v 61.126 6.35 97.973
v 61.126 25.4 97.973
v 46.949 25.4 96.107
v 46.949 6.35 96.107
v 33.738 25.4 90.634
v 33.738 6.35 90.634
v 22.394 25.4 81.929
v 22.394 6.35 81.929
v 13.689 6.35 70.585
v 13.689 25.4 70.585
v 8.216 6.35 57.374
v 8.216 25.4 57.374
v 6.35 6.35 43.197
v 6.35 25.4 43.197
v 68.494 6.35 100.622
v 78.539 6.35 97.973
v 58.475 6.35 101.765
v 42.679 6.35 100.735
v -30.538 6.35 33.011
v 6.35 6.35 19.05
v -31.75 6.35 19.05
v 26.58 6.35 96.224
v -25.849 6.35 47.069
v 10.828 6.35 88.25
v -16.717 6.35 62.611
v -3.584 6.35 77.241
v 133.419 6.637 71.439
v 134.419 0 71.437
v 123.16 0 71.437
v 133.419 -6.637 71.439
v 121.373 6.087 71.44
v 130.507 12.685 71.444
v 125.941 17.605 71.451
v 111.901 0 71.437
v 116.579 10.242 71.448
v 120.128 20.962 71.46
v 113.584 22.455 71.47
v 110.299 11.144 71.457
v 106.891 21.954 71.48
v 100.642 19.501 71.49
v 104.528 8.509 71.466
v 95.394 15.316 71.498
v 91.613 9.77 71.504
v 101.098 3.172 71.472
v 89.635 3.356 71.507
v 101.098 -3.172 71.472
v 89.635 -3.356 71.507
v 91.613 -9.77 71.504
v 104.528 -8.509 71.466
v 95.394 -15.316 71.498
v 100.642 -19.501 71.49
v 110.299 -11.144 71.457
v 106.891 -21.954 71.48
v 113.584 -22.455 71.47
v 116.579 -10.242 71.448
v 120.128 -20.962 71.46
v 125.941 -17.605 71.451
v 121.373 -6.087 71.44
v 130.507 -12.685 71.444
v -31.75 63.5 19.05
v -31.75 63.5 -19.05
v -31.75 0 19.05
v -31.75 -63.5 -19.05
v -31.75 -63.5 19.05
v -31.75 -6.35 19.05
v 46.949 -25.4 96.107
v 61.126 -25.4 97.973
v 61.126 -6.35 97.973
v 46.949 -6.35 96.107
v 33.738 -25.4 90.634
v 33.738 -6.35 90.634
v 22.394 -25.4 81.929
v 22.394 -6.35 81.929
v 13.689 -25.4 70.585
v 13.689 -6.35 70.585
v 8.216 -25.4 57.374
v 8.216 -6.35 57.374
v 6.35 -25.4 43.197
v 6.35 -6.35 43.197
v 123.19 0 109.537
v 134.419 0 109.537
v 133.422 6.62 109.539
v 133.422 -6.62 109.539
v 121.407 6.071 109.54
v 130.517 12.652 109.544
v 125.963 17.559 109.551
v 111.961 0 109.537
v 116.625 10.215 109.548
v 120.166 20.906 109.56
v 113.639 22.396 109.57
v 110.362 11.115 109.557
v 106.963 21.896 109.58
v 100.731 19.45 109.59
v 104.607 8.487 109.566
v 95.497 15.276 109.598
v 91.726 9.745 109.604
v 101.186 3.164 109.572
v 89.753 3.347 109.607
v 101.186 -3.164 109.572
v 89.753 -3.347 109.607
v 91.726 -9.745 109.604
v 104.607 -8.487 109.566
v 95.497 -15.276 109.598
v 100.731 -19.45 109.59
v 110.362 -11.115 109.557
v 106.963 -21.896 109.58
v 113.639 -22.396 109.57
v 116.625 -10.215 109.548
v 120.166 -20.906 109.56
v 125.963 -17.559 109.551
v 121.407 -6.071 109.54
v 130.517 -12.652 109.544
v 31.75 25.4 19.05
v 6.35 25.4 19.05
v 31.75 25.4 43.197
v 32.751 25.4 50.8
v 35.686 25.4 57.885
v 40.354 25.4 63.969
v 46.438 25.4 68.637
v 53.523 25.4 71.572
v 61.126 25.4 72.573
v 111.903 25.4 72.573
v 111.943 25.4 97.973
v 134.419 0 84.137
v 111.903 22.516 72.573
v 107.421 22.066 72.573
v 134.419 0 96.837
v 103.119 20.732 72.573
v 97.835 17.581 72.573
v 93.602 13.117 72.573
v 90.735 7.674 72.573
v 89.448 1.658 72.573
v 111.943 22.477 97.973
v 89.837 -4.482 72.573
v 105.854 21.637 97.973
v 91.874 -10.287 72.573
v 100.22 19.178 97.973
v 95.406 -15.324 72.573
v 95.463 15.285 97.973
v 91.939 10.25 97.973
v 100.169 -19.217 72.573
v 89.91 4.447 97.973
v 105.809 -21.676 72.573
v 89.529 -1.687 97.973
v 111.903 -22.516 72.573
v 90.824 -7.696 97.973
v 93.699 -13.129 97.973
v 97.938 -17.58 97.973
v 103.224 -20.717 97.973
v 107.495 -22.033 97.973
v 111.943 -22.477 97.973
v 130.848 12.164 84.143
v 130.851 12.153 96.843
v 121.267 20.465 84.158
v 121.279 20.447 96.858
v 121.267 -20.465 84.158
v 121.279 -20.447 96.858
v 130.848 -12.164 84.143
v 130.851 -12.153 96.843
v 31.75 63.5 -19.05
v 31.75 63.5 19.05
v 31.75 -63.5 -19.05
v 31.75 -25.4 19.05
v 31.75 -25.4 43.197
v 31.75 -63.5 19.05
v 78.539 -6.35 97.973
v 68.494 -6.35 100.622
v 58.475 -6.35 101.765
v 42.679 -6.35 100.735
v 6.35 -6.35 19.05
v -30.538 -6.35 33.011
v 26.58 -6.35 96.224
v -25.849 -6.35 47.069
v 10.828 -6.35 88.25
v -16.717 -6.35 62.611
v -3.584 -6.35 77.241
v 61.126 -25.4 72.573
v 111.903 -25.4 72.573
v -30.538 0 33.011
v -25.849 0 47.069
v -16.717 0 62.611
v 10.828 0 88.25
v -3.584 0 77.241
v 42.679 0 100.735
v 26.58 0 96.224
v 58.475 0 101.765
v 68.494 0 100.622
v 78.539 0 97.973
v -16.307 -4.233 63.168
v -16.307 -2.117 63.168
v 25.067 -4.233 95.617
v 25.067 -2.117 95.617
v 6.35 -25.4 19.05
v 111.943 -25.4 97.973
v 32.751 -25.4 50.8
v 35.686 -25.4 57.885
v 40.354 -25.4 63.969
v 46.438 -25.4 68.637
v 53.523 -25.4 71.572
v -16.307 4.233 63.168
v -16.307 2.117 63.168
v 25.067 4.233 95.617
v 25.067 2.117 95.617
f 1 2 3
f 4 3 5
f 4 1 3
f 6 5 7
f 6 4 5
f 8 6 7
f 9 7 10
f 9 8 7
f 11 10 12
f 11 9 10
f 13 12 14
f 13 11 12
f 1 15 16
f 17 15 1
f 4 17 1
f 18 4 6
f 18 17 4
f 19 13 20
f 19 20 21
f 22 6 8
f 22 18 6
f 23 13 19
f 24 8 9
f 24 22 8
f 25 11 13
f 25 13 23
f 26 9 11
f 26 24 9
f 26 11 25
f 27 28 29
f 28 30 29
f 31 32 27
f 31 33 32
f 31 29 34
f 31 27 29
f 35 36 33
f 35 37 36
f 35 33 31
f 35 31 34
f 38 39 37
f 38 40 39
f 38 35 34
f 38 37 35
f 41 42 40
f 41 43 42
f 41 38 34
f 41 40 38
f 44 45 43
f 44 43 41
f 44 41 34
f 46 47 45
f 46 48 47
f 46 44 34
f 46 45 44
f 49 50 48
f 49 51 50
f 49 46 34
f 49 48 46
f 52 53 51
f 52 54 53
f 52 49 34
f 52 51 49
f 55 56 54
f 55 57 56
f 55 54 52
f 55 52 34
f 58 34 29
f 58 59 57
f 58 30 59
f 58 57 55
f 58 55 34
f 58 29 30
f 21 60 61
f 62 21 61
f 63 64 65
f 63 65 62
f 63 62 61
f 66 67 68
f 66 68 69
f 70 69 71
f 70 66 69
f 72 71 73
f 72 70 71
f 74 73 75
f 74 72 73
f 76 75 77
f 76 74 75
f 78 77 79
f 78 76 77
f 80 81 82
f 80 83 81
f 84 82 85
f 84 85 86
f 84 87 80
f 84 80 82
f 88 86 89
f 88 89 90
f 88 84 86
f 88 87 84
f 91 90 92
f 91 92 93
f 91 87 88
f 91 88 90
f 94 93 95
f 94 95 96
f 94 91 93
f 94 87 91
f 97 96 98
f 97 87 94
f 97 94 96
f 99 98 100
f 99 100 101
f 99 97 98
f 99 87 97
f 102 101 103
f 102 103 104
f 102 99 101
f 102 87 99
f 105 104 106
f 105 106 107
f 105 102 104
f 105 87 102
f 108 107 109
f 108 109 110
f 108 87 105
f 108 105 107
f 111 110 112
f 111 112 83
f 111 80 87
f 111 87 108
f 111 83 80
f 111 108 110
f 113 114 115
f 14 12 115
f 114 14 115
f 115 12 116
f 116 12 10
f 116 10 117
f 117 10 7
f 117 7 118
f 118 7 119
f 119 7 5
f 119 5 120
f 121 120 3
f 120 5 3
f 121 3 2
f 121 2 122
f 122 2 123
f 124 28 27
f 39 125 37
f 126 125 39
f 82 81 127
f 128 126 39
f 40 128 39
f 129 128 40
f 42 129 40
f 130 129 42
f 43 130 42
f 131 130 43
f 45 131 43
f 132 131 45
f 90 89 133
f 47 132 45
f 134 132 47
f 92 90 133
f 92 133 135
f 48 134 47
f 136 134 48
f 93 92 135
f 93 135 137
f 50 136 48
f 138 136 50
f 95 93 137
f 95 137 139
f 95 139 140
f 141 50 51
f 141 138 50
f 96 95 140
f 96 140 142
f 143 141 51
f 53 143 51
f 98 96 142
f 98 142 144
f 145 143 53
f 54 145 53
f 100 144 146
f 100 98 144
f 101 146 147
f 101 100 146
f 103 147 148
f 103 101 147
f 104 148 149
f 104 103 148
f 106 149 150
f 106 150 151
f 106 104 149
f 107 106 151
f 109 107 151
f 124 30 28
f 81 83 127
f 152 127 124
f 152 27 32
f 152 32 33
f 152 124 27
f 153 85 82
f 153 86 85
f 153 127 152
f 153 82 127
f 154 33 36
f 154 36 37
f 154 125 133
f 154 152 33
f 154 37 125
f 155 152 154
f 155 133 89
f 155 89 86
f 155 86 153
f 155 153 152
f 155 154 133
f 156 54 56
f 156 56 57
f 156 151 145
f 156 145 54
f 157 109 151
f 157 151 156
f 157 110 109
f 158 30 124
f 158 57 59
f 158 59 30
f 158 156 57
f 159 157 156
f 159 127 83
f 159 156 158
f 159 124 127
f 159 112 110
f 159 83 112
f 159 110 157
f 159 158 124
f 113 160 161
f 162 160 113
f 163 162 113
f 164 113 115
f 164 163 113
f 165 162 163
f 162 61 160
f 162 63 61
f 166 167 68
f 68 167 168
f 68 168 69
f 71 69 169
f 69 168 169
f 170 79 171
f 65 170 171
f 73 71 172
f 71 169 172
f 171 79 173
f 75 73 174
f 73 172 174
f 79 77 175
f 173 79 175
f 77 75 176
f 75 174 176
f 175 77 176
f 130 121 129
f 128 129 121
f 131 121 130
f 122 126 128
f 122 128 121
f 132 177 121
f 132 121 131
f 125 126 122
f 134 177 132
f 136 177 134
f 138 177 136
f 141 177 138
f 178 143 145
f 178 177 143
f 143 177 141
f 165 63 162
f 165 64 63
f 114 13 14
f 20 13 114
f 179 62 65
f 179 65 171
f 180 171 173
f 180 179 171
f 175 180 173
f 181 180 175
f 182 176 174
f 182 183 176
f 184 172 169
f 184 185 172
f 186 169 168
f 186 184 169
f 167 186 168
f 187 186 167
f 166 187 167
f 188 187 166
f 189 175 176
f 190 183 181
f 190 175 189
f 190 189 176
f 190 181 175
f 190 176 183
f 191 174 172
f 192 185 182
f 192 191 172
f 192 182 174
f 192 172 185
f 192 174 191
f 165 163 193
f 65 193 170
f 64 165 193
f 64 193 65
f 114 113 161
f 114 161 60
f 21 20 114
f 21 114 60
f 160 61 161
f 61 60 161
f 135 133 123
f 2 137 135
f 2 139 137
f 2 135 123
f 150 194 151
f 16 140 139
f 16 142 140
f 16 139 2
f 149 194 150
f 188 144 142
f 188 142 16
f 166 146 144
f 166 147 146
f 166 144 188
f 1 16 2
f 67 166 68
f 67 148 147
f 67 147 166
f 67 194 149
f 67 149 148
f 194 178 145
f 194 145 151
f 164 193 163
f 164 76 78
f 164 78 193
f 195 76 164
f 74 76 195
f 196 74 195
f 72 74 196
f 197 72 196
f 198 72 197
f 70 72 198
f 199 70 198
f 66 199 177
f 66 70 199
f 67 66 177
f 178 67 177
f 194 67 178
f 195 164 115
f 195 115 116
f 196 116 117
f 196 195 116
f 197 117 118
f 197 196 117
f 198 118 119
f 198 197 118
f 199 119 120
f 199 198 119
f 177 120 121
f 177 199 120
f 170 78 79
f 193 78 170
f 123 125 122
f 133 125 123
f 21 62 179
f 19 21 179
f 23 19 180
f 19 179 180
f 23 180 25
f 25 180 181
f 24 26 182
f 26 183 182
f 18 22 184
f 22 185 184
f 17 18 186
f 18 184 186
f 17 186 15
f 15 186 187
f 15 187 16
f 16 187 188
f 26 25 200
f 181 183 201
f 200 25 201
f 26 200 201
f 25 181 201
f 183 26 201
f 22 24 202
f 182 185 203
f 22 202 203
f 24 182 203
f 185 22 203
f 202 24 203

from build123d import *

# Parameters (mm, degrees)
F1_DEPTH = 63.5
F2_DEPTH = 25.4
F3_DEPTH = 6.35


with BuildPart() as f1:
    # F0 (on Front) → F1 (new body, symmetric)
    with BuildSketch(Plane.XZ):
        Polygon((-31.75, -19.05), (31.75, -19.05), (31.75, 19.05), (6.35, 19.05), (-31.75, 19.05), align=None)
    extrude(amount=F1_DEPTH, both=True)

    # F0 (on Front) → F2 (join, symmetric)
    with BuildSketch(Plane.XZ):
        with BuildLine():
            Line((6.35, 19.05), (31.75, 19.05))
            Line((31.75, 19.05), (31.75, 43.1967032691))
            ThreePointArc((31.75, 43.1967032691), (40.3541311515, 63.9689133875), (61.1263412699, 72.573044539))
            Line((61.1263412699, 72.573044539), (78.5394700097, 72.573044539))
            Line((78.5394700097, 72.573044539), (78.5394700097, 97.973044539))
            Line((78.5394700097, 97.973044539), (61.1263412699, 97.973044539))
            ThreePointArc((61.1263412699, 97.973044539), (22.3936189094, 81.9294256296), (6.35, 43.1967032691))
            Line((6.35, 43.1967032691), (6.35, 19.05))
        make_face()
        Polygon((111.9425526827, 97.973044539), (78.5394700097, 97.973044539), (78.5394700097, 72.573044539), (111.903113532, 72.573044539), align=None)
    extrude(amount=F2_DEPTH, both=True)

    # F0 (on Front) → F3 (join, symmetric)
    with BuildSketch(Plane.XZ):
        with BuildLine():
            add(Edge.make_bspline(
                [(-31.75, 19.05), (-33.8824763894, 62.8609061241), (23.62857759, 116.8053820729), (78.5394700097, 97.973044539)],
                knots=[0, 0, 0, 0, 135.6193723415, 135.6193723415, 135.6193723415, 135.6193723415], degree=3))
            Line((-31.75, 19.05), (6.35, 19.05))
            Line((6.35, 19.05), (6.35, 43.1967032691))
            ThreePointArc((6.35, 43.1967032691), (22.3936189094, 81.9294256296), (61.1263412699, 97.973044539))
            Line((61.1263412699, 97.973044539), (78.5394700097, 97.973044539))
        make_face()
    extrude(amount=F3_DEPTH, both=True)

    # F0 (on Front) → F4 (revolve)
    with BuildSketch(Plane.XZ):
        Polygon((111.9605090454, 109.5374825459), (111.9425526827, 97.973044539), (111.903113532, 72.573044539), (111.9013503194, 71.4374825459), (134.4194700097, 71.4374825459), (134.4194700097, 109.5374825459), align=None)
    revolve(axis=Axis((111.9309296824, 0, 90.4874825459), (0.0015527206, 0, 0.9999987945)))


solid = f1.part
